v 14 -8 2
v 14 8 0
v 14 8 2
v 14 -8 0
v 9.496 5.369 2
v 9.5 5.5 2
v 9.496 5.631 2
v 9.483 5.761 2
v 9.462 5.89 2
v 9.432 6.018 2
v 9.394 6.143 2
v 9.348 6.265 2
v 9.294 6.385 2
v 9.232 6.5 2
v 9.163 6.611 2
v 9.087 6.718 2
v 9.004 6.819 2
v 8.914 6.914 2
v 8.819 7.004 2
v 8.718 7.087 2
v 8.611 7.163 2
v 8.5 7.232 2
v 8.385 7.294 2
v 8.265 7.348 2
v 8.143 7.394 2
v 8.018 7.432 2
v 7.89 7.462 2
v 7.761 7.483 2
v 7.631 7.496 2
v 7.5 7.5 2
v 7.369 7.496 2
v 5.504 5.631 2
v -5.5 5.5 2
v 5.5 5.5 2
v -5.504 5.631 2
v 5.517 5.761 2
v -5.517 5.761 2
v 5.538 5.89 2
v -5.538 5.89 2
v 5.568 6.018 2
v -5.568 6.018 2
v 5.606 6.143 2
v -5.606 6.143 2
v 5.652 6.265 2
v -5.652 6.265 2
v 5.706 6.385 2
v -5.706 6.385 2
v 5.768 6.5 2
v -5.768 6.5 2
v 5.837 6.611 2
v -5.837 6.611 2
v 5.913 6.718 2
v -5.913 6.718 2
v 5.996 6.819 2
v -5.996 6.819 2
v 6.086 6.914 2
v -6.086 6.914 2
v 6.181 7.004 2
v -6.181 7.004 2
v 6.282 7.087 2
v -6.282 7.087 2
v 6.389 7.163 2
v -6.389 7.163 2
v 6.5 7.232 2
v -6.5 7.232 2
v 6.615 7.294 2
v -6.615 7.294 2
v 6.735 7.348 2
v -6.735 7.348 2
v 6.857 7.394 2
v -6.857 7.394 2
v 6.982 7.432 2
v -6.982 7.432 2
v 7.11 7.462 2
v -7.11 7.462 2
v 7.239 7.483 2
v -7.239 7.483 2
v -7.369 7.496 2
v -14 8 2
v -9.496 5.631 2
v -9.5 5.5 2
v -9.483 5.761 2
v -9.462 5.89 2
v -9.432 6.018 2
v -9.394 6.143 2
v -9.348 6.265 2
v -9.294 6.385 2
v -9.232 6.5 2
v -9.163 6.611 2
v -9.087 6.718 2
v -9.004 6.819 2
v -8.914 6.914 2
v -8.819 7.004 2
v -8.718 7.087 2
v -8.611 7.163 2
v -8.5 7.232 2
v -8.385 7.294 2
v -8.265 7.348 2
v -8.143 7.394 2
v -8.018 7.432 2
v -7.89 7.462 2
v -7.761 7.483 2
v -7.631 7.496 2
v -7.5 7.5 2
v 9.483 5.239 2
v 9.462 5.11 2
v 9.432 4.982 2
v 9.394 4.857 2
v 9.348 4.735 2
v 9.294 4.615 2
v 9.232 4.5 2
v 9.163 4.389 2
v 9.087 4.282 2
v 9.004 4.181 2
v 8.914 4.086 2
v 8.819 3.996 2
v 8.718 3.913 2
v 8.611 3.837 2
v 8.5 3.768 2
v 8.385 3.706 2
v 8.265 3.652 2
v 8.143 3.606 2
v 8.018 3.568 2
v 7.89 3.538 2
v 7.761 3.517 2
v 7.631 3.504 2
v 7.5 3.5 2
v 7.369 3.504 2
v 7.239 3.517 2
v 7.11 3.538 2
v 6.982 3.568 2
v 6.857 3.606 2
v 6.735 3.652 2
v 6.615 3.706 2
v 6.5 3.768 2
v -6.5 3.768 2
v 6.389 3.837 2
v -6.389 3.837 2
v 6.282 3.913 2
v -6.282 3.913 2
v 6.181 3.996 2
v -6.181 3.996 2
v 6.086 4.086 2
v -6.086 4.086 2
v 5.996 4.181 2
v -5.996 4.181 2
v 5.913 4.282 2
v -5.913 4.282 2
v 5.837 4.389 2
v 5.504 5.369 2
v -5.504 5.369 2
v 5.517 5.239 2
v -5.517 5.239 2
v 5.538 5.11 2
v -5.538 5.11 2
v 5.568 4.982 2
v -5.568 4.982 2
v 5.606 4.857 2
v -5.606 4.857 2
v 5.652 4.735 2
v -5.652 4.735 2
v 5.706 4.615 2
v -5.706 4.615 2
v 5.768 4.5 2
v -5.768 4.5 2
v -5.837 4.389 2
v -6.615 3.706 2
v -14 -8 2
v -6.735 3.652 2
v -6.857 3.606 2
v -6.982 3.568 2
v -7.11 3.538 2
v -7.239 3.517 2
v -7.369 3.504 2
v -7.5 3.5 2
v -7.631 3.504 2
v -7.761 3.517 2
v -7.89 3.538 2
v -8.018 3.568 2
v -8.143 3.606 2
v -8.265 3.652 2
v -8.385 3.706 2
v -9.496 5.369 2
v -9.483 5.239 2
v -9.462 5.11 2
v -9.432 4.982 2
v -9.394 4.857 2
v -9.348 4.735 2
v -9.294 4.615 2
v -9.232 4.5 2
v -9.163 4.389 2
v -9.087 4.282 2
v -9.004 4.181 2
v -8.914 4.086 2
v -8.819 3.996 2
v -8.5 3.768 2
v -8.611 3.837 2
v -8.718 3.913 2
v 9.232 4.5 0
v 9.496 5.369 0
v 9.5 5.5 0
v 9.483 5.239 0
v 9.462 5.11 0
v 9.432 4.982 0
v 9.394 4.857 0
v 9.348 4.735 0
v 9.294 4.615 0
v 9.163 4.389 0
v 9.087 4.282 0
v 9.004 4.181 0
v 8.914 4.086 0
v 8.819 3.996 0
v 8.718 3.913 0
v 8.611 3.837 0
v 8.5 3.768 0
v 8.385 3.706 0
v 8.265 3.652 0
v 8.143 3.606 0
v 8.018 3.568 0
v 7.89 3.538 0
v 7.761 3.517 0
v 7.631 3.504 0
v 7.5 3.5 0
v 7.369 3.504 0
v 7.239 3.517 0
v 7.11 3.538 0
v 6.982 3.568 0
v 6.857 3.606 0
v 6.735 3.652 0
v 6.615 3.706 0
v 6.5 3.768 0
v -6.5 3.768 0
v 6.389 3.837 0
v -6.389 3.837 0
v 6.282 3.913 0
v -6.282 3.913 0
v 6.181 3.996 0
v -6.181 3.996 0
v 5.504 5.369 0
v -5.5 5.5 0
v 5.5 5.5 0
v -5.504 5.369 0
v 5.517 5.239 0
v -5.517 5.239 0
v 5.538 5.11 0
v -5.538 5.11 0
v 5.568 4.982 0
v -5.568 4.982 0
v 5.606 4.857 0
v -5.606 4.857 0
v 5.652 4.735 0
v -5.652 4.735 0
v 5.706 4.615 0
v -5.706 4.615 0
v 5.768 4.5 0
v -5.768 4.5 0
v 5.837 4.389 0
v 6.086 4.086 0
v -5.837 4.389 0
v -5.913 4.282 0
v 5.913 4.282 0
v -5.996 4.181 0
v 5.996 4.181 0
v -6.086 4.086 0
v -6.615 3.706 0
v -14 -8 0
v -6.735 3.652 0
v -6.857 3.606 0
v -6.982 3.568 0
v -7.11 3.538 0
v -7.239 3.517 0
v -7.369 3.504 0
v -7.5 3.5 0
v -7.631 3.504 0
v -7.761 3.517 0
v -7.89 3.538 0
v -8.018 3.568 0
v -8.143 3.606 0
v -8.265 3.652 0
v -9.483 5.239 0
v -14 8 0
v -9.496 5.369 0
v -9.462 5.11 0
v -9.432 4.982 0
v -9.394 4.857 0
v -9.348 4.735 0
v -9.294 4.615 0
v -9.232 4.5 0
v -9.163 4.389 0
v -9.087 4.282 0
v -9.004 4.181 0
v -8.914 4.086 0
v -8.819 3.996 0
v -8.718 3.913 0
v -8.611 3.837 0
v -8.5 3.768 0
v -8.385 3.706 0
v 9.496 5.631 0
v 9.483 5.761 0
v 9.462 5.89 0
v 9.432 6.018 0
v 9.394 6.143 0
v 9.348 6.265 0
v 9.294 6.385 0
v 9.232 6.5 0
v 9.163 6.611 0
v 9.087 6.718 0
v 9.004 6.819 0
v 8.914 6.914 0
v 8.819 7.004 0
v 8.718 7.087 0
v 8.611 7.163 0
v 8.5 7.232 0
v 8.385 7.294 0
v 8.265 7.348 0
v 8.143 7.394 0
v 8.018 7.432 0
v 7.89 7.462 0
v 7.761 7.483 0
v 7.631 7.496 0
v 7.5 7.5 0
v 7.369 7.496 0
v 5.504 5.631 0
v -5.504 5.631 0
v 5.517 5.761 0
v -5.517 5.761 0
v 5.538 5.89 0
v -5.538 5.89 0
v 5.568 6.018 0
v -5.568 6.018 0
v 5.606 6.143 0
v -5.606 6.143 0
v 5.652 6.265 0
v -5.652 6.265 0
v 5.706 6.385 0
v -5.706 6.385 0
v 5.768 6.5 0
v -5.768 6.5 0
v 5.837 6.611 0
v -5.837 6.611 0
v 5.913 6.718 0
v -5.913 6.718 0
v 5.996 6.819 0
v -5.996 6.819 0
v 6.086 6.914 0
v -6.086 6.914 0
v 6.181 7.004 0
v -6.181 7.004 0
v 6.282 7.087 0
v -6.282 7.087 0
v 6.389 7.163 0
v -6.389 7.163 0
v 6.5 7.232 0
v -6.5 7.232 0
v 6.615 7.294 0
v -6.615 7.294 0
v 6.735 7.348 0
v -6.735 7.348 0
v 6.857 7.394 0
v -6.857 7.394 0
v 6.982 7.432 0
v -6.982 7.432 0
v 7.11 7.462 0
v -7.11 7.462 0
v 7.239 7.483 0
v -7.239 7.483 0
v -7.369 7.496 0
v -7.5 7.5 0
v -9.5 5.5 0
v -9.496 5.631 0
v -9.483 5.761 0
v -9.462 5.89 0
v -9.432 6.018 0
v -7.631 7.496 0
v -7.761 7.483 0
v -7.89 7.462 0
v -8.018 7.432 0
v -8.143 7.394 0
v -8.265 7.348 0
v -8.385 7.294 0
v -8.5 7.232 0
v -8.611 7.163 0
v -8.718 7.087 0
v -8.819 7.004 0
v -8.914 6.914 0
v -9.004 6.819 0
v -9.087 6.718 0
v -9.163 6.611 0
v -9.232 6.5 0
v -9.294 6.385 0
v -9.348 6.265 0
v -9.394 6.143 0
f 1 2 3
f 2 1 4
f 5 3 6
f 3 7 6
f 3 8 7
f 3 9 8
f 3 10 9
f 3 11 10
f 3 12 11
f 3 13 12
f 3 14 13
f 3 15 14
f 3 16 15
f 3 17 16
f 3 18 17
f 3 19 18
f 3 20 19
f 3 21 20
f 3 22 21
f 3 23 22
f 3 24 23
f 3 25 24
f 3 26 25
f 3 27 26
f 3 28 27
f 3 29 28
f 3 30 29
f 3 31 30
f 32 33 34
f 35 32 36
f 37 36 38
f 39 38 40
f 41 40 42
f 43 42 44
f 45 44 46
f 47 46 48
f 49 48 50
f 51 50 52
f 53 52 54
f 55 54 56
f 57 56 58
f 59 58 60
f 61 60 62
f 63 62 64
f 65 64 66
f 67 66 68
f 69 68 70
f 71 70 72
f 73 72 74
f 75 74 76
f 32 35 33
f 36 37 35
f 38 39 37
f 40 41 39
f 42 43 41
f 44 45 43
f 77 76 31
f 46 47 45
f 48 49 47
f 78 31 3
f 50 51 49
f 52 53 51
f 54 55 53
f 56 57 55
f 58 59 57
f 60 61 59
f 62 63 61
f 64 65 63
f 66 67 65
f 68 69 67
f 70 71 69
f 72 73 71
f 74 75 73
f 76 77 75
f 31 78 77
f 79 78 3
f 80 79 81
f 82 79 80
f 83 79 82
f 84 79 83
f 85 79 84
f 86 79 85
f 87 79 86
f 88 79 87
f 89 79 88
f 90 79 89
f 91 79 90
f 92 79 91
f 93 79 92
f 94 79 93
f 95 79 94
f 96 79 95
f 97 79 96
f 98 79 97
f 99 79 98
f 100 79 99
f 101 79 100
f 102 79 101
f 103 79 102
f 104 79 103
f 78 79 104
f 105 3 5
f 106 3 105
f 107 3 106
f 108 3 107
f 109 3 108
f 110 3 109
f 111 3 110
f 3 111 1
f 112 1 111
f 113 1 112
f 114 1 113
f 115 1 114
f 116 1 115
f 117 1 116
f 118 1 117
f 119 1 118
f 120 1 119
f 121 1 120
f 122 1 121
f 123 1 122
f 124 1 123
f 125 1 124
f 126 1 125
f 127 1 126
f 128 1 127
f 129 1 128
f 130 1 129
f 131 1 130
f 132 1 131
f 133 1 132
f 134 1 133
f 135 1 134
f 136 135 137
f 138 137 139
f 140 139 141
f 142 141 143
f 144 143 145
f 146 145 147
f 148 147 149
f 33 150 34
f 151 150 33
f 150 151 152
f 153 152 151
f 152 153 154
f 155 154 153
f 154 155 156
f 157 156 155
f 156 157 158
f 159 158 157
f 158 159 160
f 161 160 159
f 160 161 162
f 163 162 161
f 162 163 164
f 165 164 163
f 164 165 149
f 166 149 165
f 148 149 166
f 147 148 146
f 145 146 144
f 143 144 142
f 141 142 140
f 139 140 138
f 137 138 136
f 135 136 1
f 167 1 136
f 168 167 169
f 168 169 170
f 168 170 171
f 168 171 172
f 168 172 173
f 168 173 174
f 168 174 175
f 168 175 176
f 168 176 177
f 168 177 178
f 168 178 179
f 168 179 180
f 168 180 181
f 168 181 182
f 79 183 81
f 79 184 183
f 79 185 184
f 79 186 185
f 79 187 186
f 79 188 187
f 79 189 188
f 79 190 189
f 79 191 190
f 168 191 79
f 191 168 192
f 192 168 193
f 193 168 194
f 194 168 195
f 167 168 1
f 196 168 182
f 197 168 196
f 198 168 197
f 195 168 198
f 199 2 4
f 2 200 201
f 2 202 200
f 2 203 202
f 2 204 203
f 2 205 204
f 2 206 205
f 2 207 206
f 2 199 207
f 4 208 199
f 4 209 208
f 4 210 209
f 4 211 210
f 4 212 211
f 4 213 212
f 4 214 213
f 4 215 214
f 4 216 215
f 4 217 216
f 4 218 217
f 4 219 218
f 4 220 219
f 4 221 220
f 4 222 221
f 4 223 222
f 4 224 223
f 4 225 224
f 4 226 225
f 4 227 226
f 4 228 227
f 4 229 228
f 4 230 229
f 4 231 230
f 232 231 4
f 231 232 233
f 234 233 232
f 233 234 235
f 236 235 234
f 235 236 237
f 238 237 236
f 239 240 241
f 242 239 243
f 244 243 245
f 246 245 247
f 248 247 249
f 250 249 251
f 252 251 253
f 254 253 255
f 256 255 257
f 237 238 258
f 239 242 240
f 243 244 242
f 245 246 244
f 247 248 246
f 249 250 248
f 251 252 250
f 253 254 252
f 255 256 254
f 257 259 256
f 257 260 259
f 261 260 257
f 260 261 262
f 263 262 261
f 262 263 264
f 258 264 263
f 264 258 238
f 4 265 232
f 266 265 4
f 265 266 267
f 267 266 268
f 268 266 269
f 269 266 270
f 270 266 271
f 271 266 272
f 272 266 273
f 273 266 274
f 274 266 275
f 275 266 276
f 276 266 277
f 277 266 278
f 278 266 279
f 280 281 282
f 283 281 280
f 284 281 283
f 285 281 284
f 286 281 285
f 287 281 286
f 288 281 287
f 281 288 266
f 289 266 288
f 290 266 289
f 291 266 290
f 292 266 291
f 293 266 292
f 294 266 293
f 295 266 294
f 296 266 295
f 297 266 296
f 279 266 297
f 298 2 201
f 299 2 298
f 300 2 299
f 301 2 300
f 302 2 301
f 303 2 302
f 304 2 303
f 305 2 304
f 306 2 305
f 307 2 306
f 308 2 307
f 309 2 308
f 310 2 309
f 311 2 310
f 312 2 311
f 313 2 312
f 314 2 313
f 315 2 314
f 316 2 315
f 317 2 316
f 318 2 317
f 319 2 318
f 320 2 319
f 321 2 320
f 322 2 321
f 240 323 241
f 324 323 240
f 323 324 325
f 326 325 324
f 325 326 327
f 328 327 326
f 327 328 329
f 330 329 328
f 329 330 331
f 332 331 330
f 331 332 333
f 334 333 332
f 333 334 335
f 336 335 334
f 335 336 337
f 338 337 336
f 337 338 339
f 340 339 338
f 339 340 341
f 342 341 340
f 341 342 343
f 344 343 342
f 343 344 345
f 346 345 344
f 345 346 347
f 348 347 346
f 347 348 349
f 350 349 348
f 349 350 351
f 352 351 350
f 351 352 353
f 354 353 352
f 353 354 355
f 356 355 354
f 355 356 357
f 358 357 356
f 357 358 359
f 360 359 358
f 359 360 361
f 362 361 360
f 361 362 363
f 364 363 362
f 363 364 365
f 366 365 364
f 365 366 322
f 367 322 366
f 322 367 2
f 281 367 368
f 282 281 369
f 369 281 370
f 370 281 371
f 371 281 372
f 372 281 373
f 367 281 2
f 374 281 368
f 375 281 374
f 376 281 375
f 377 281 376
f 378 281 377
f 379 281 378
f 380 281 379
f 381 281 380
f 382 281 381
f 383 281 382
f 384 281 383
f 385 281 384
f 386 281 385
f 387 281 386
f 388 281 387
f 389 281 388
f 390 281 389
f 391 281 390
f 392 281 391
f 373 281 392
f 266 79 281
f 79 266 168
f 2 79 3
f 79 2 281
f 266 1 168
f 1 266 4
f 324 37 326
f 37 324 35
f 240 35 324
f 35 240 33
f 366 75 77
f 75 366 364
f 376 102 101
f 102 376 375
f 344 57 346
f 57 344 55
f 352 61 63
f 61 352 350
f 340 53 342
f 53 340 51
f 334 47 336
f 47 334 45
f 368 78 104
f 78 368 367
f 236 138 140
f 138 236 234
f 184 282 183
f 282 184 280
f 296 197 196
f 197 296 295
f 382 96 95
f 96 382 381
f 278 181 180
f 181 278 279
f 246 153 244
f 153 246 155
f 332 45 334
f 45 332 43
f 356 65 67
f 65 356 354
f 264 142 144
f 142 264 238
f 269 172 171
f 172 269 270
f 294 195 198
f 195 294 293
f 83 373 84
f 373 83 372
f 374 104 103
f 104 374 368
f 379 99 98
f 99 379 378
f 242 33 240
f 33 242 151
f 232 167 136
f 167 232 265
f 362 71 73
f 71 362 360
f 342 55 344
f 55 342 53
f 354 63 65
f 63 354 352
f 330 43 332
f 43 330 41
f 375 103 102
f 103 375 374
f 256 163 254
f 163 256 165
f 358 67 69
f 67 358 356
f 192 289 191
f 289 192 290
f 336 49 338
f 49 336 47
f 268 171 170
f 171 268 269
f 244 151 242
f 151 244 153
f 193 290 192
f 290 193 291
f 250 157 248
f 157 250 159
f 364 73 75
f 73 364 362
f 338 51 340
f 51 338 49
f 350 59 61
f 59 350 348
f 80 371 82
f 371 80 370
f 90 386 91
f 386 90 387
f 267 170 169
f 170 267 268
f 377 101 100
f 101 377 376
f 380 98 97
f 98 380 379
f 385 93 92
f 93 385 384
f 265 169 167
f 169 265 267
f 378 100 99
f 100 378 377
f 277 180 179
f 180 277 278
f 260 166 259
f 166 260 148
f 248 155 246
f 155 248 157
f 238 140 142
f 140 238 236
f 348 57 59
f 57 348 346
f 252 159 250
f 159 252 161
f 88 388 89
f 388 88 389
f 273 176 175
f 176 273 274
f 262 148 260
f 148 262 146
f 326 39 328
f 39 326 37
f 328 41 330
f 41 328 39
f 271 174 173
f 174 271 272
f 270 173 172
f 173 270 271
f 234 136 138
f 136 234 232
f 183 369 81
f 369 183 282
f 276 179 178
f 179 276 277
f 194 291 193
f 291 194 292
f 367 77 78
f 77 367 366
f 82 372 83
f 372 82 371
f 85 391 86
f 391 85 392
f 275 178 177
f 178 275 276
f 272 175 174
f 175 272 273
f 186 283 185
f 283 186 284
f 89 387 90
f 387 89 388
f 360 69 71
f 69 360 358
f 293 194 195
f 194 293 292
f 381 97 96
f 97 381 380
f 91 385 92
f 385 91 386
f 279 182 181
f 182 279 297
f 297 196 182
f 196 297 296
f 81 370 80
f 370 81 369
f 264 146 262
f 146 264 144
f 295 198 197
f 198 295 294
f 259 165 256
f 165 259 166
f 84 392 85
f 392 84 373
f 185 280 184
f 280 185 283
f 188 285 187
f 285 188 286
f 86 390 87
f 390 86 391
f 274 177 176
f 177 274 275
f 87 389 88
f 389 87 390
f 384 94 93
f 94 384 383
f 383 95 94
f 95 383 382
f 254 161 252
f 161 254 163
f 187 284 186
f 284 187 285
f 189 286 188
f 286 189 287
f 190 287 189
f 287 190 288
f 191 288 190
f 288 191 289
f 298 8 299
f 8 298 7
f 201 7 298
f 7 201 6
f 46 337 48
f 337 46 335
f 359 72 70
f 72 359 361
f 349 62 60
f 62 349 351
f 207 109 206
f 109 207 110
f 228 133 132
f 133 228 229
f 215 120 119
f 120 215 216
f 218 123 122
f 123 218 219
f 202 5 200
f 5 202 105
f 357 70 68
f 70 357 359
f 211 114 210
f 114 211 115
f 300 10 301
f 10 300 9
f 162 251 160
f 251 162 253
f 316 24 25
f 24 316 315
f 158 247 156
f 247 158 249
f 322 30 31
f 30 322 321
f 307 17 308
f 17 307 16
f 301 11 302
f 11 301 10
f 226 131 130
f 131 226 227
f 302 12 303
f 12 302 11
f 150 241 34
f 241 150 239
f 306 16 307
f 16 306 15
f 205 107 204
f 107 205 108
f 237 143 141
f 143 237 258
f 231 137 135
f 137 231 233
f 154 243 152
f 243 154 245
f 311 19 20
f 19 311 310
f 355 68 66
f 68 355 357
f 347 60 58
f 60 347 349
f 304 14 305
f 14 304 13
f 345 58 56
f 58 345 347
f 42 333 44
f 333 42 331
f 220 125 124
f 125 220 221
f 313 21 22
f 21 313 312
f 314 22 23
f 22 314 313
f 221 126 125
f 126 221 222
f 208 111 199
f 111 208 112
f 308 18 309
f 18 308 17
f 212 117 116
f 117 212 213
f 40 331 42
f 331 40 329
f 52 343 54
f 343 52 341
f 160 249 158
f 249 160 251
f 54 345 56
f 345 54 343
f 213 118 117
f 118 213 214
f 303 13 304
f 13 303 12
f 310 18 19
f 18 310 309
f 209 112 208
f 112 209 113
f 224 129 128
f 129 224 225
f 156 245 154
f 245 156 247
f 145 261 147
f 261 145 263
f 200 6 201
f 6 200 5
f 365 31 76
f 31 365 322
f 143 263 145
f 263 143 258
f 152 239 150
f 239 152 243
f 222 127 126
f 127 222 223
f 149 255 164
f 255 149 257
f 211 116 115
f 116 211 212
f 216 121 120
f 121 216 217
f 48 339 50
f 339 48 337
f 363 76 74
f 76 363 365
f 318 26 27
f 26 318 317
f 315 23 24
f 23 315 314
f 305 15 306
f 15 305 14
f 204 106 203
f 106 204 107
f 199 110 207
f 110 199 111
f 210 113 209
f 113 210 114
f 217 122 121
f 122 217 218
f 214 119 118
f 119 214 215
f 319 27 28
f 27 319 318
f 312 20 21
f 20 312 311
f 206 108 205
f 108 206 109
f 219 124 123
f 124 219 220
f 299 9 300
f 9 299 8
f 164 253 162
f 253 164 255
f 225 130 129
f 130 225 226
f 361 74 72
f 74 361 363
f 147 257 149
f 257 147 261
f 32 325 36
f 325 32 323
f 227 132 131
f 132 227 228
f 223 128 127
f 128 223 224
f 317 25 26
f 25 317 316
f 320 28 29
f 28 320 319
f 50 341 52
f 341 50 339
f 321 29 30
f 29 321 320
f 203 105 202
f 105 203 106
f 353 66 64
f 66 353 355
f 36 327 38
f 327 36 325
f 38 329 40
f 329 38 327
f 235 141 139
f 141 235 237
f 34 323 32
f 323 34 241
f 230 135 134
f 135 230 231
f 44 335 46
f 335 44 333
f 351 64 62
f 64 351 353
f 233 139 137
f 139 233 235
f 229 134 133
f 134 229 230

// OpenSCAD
// Auto-generated from tests/data/feature_fixtures_manifest.json
// fixture: plate_near_boundary_linear
// fixture_type: plate
// description: Linear hole pair placed near the outer plate boundary without crossing it.
$fn = 96;

plate_size = [28.000000, 16.000000, 2.000000];
plate_origin = [-14.000000, -8.000000, 0.000000];

module through_hole(center, diameter, height) {
  translate(center) cylinder(d=diameter, h=height, center=false);
}

module through_slot(start, end, width, height) {
  hull() {
    through_hole(start, width, height);
    through_hole(end, width, height);
  }
}

module counterbore_hole(center, through_d, bore_d, bore_depth, plate_thickness) {
  translate([center[0], center[1], -0.1])
    cylinder(d=through_d, h=plate_thickness + 0.2, center=false);
  translate([center[0], center[1], plate_thickness - bore_depth])
    cylinder(d=bore_d, h=bore_depth + 0.1, center=false);
}

difference() {
  translate(plate_origin) cube(plate_size);
  through_hole([-7.500000, 5.500000, -0.100000], 4.000000, 2.200000);  // hole_0
  through_hole([7.500000, 5.500000, -0.100000], 4.000000, 2.200000);  // hole_1
}
